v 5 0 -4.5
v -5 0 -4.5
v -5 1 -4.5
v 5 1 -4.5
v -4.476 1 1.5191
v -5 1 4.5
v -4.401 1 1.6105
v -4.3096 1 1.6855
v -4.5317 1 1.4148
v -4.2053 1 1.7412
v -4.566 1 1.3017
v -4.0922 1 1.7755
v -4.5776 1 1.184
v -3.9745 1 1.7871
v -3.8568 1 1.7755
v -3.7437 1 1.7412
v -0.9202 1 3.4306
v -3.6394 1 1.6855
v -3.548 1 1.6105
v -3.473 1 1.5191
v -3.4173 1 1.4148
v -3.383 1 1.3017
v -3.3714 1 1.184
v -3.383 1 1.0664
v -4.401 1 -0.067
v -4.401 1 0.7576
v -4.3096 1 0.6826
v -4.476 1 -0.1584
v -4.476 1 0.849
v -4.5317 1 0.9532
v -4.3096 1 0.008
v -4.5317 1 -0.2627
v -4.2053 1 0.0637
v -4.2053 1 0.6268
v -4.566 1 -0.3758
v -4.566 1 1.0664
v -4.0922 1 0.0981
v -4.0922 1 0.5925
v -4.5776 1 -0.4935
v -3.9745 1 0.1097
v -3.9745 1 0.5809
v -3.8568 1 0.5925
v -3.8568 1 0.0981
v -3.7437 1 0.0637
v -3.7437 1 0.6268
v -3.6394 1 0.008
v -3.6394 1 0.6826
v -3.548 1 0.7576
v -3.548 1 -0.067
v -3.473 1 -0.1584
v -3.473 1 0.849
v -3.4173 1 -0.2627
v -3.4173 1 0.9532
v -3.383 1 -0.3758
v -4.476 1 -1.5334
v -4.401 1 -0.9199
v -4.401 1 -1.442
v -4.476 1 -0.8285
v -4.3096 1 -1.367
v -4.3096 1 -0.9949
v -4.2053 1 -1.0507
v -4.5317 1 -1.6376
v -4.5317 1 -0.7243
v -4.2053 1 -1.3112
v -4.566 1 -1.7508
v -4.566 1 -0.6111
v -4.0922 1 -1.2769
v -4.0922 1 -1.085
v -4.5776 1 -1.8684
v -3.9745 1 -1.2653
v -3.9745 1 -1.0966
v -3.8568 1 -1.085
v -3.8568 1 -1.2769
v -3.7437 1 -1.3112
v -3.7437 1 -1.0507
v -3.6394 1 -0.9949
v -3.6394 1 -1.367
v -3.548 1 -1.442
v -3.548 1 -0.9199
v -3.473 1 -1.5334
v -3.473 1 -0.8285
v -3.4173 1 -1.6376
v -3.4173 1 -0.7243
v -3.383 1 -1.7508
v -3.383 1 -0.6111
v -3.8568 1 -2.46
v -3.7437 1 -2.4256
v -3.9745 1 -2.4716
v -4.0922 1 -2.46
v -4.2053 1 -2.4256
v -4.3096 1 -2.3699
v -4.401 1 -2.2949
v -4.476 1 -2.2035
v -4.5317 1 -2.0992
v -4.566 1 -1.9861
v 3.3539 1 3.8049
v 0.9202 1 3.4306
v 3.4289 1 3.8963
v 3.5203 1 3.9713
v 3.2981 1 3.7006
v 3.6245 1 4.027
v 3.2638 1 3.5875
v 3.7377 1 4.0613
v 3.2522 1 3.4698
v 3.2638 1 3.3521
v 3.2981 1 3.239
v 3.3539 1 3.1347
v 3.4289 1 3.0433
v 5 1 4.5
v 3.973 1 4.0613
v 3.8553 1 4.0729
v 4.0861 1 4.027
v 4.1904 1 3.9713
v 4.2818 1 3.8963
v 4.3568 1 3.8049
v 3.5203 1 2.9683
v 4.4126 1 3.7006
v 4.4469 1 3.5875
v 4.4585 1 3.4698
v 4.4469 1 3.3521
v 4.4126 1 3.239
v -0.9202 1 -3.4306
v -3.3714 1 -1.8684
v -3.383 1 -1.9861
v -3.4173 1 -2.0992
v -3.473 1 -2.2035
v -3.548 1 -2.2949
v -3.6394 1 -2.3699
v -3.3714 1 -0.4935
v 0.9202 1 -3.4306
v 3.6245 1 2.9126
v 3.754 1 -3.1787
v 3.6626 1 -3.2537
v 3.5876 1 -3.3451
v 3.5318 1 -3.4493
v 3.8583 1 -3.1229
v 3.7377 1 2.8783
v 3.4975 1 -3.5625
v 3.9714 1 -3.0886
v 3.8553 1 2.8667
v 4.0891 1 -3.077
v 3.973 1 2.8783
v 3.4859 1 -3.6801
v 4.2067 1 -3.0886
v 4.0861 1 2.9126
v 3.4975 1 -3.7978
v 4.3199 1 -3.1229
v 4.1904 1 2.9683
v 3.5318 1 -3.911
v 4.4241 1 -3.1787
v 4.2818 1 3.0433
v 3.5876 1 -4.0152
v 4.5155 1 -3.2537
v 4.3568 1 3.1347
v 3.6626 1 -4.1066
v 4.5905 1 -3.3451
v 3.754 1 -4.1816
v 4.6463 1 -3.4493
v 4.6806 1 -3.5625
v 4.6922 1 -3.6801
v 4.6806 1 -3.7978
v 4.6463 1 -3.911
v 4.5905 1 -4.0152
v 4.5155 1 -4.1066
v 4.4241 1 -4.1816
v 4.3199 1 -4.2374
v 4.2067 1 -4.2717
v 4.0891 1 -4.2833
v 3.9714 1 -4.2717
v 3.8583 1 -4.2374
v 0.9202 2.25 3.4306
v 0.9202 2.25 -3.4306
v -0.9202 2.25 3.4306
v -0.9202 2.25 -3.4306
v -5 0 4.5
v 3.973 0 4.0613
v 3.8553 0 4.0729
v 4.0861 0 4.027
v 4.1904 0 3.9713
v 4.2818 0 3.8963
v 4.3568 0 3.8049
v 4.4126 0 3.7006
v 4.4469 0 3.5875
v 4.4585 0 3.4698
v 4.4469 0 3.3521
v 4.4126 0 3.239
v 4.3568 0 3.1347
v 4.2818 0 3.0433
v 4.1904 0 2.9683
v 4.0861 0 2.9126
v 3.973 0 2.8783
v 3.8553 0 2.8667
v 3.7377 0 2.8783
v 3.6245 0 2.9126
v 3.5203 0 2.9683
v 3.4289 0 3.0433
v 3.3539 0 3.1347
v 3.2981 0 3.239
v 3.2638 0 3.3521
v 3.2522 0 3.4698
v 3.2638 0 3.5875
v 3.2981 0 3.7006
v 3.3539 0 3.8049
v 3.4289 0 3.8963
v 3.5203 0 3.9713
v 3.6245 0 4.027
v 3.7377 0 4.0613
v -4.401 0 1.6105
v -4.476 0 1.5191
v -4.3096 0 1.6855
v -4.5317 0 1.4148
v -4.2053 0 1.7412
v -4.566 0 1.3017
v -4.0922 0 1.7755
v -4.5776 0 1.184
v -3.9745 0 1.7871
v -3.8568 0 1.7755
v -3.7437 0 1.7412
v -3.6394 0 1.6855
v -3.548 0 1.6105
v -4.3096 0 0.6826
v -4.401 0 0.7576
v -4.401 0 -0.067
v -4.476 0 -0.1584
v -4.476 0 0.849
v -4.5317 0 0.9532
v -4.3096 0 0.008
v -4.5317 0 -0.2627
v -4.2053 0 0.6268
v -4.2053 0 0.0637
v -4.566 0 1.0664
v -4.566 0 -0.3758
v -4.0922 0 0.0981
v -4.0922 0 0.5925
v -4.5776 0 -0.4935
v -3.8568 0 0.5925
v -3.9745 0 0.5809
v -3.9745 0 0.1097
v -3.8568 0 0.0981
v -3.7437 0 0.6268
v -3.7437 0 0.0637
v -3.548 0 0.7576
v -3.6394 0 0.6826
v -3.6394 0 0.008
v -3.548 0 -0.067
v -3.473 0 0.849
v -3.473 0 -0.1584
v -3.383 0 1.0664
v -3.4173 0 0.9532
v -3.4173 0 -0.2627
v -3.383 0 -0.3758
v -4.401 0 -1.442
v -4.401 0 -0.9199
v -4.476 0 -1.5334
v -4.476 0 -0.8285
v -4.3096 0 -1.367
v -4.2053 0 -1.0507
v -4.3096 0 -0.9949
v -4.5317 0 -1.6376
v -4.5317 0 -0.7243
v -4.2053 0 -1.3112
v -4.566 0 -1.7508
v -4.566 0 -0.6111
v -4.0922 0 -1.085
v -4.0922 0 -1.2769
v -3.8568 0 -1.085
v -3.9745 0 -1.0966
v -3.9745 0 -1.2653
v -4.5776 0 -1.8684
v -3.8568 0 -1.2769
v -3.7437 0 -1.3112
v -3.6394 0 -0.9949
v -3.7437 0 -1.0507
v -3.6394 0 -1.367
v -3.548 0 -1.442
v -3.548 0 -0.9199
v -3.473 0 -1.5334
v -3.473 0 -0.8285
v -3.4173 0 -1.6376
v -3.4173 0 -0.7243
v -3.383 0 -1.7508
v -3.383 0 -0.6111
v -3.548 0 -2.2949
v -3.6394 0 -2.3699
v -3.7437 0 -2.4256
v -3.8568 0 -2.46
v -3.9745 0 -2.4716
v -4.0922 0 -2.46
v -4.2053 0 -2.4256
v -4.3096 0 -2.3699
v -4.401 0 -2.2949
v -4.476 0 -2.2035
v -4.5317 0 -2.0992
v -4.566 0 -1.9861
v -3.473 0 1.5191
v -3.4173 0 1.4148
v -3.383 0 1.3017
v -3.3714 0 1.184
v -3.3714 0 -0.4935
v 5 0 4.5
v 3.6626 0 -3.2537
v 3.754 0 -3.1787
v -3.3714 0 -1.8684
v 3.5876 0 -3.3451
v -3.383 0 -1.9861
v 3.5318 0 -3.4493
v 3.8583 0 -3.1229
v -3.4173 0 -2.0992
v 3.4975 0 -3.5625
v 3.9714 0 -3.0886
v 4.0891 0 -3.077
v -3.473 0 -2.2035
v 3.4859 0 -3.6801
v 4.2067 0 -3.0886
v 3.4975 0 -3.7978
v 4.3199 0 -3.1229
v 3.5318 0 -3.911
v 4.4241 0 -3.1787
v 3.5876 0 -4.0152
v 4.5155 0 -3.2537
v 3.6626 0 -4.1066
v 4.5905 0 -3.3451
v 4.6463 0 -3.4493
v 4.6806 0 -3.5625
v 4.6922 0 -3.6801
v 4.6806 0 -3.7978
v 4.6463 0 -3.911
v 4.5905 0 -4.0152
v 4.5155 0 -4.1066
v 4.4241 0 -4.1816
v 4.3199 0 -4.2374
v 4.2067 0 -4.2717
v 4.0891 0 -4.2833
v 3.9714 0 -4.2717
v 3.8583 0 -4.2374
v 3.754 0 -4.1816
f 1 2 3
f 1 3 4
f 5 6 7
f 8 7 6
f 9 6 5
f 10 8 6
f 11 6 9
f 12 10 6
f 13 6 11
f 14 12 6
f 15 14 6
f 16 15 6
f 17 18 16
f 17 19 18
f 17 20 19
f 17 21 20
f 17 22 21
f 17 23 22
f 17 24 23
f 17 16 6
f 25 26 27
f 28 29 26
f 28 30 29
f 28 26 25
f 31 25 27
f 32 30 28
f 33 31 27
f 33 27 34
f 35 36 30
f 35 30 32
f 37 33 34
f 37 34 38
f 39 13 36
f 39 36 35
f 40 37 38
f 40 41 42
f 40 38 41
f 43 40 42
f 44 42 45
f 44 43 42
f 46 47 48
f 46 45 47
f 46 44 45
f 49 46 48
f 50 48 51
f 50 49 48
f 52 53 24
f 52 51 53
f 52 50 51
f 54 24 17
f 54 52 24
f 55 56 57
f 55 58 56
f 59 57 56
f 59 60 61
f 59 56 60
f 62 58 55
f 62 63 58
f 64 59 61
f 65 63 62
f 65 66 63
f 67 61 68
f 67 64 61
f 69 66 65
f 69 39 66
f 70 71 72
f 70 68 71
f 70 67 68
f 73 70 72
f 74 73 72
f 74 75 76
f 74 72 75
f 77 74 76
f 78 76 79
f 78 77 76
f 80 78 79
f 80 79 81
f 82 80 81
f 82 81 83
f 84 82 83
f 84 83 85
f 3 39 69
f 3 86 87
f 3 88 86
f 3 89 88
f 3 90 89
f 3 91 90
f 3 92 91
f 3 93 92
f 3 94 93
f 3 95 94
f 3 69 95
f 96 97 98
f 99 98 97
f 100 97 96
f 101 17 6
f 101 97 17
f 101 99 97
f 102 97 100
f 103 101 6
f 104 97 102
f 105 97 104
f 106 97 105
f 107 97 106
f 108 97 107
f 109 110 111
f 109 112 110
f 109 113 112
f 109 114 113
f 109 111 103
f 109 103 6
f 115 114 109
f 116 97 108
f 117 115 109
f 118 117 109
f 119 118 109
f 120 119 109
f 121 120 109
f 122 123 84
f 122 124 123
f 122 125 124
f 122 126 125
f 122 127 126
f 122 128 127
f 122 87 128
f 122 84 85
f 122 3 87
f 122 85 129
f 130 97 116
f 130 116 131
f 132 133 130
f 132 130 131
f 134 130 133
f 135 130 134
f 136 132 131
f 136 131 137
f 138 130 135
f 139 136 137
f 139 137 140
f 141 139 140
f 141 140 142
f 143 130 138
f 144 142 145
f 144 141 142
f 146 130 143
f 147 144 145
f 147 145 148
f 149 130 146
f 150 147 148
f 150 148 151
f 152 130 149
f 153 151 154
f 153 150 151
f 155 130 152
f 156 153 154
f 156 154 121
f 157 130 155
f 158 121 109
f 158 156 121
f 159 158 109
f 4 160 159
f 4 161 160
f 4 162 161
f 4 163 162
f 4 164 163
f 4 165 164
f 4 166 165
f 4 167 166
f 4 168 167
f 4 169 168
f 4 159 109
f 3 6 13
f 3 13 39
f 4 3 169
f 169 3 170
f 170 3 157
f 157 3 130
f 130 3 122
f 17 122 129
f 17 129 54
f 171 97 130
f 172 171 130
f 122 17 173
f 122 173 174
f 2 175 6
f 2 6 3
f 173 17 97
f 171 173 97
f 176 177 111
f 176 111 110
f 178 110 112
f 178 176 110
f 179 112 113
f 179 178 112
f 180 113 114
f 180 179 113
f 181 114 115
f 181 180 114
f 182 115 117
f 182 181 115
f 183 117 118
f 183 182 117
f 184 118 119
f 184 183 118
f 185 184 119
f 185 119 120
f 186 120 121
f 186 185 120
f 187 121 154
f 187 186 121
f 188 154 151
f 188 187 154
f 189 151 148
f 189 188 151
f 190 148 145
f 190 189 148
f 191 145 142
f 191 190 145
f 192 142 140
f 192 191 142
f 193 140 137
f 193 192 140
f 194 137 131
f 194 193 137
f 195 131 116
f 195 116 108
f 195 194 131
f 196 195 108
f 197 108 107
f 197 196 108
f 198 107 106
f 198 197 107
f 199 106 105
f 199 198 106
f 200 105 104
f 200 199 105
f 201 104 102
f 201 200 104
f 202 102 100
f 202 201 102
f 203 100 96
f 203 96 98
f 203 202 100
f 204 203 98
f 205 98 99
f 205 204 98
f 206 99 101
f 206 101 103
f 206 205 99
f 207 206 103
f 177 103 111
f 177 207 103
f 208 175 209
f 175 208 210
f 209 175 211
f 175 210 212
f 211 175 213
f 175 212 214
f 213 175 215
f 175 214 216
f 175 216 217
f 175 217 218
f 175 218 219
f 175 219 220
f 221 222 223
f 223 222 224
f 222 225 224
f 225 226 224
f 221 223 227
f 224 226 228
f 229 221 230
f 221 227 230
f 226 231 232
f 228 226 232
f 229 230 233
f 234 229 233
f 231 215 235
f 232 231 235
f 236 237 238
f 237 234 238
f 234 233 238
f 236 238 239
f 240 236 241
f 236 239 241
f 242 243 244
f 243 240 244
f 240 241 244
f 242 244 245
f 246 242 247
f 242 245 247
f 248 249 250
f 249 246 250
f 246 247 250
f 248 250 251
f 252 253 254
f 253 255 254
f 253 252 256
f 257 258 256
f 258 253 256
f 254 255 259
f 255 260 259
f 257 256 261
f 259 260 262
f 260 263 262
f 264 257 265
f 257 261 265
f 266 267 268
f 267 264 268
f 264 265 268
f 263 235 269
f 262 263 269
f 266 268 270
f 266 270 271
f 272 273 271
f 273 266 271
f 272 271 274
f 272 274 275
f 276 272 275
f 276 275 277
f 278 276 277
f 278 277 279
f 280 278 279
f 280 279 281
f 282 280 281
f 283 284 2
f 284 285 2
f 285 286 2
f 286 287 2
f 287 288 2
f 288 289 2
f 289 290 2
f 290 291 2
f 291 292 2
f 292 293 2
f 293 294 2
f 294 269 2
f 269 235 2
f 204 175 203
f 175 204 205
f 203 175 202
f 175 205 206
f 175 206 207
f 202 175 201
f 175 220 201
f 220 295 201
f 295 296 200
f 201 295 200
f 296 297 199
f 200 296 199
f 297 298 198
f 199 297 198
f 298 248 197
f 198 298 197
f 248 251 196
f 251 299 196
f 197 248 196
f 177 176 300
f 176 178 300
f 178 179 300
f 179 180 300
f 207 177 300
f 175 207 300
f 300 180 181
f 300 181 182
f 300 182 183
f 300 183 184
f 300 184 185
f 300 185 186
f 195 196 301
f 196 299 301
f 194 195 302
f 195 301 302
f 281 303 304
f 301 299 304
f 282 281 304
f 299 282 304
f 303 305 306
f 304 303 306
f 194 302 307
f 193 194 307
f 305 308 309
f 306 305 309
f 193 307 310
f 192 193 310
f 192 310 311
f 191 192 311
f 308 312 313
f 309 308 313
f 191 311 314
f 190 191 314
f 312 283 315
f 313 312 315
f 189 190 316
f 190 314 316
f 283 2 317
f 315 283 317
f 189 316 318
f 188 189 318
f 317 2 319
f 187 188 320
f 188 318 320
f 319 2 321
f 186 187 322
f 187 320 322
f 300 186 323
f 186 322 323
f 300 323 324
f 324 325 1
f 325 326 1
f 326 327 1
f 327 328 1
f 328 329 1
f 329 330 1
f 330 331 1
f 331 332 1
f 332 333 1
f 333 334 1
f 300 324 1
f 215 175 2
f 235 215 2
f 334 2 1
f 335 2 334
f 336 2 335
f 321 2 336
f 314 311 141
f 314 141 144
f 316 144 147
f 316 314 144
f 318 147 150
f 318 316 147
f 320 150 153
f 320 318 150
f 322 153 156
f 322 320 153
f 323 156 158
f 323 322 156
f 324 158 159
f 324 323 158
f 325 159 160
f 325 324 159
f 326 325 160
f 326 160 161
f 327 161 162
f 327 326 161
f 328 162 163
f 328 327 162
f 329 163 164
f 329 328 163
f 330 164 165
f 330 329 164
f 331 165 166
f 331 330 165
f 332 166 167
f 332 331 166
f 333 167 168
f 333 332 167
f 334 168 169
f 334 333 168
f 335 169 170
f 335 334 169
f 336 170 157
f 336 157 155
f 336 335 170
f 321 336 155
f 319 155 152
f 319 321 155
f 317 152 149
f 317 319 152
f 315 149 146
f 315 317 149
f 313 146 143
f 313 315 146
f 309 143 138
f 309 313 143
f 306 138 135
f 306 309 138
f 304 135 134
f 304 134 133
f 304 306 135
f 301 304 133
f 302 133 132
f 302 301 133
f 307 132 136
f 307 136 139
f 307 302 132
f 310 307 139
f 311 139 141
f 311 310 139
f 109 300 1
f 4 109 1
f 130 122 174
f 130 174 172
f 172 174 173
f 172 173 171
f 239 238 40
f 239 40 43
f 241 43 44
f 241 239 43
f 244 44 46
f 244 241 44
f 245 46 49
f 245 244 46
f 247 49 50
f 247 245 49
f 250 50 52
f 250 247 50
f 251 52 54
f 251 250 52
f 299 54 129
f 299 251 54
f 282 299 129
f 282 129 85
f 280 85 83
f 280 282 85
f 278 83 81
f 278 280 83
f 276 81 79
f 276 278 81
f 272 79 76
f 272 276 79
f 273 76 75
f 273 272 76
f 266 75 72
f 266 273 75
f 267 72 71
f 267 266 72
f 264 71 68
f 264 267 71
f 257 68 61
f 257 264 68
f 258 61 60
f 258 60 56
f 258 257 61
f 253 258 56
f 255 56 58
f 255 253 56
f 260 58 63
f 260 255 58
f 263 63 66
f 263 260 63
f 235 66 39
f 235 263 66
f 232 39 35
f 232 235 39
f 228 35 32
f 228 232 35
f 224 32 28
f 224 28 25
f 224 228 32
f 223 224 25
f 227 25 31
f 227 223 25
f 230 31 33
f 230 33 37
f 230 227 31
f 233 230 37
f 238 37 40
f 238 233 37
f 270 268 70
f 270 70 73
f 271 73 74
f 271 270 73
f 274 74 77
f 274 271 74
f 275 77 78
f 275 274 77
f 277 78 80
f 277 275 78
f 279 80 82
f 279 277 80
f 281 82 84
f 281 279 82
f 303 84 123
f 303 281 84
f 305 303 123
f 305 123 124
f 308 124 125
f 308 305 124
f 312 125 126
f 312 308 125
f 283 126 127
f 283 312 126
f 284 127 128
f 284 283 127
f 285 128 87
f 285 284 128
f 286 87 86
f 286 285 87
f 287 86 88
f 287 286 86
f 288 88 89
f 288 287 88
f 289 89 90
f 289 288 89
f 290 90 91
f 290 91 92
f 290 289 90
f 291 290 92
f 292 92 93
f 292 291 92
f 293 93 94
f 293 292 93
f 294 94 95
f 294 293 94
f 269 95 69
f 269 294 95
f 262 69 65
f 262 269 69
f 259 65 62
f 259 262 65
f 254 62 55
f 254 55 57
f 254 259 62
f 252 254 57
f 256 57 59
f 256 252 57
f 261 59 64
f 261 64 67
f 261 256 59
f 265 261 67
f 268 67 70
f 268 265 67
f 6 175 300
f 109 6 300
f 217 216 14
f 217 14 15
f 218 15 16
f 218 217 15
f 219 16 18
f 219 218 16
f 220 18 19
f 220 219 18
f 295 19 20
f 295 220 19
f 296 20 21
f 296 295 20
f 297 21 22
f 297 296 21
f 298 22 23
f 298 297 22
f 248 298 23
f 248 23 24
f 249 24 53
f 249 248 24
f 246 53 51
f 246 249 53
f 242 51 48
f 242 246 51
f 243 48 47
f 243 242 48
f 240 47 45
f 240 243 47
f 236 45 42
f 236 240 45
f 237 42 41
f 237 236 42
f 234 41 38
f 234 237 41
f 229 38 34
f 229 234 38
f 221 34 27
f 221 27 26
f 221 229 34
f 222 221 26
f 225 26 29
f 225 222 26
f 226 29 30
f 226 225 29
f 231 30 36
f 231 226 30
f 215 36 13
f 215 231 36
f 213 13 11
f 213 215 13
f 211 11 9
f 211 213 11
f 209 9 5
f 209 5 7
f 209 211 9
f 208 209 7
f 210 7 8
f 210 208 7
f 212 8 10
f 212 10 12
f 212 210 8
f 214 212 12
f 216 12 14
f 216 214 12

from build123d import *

# Parameters (mm, degrees)
SKETCH1_W           = 10
SKETCH1_H           = 9
SKETCH1_R           = 0.603114575
BOSS_EXTRUDE1_DEPTH = 1
SKETCH2_W           = 1.840309862
SKETCH2_H           = 6.861155246
BOSS_EXTRUDE2_DEPTH = 1.25


with BuildPart() as part:
    # Sketch1 → Boss-Extrude1 (new body)
    with BuildSketch(Plane(origin=(0, 0, 0), x_dir=(1, 0, 0), z_dir=(0, 1, 0))):
        Rectangle(SKETCH1_W, SKETCH1_H)
        with Locations(Location((-3.974491731, -1.184022837, 0), (0, 0, 270))):
            Circle(SKETCH1_R, mode=Mode.SUBTRACT)
        with Locations(Location((-3.974491731, 0.493456275, 0), (0, 0, 270))):
            Circle(SKETCH1_R, mode=Mode.SUBTRACT)
        with Locations(Location((-3.974491731, 1.868439153, 0), (0, 0, 270))):
            Circle(SKETCH1_R, mode=Mode.SUBTRACT)
        with Locations(Location((4.08905372, 3.680148348, 0), (0, 0, 270))):
            Circle(SKETCH1_R, mode=Mode.SUBTRACT)
        with Locations(Location((3.855346006, -3.469811406, 0), (0, 0, 270))):
            Circle(SKETCH1_R, mode=Mode.SUBTRACT)
    extrude(amount=BOSS_EXTRUDE1_DEPTH)

    # Sketch2 → Boss-Extrude2 (add)
    with BuildSketch(Plane(origin=(0, 1, 0), x_dir=(1, 0, 0), z_dir=(0, 1, 0))):
        Rectangle(SKETCH2_W, SKETCH2_H)
    extrude(amount=BOSS_EXTRUDE2_DEPTH)


solid = part.part
